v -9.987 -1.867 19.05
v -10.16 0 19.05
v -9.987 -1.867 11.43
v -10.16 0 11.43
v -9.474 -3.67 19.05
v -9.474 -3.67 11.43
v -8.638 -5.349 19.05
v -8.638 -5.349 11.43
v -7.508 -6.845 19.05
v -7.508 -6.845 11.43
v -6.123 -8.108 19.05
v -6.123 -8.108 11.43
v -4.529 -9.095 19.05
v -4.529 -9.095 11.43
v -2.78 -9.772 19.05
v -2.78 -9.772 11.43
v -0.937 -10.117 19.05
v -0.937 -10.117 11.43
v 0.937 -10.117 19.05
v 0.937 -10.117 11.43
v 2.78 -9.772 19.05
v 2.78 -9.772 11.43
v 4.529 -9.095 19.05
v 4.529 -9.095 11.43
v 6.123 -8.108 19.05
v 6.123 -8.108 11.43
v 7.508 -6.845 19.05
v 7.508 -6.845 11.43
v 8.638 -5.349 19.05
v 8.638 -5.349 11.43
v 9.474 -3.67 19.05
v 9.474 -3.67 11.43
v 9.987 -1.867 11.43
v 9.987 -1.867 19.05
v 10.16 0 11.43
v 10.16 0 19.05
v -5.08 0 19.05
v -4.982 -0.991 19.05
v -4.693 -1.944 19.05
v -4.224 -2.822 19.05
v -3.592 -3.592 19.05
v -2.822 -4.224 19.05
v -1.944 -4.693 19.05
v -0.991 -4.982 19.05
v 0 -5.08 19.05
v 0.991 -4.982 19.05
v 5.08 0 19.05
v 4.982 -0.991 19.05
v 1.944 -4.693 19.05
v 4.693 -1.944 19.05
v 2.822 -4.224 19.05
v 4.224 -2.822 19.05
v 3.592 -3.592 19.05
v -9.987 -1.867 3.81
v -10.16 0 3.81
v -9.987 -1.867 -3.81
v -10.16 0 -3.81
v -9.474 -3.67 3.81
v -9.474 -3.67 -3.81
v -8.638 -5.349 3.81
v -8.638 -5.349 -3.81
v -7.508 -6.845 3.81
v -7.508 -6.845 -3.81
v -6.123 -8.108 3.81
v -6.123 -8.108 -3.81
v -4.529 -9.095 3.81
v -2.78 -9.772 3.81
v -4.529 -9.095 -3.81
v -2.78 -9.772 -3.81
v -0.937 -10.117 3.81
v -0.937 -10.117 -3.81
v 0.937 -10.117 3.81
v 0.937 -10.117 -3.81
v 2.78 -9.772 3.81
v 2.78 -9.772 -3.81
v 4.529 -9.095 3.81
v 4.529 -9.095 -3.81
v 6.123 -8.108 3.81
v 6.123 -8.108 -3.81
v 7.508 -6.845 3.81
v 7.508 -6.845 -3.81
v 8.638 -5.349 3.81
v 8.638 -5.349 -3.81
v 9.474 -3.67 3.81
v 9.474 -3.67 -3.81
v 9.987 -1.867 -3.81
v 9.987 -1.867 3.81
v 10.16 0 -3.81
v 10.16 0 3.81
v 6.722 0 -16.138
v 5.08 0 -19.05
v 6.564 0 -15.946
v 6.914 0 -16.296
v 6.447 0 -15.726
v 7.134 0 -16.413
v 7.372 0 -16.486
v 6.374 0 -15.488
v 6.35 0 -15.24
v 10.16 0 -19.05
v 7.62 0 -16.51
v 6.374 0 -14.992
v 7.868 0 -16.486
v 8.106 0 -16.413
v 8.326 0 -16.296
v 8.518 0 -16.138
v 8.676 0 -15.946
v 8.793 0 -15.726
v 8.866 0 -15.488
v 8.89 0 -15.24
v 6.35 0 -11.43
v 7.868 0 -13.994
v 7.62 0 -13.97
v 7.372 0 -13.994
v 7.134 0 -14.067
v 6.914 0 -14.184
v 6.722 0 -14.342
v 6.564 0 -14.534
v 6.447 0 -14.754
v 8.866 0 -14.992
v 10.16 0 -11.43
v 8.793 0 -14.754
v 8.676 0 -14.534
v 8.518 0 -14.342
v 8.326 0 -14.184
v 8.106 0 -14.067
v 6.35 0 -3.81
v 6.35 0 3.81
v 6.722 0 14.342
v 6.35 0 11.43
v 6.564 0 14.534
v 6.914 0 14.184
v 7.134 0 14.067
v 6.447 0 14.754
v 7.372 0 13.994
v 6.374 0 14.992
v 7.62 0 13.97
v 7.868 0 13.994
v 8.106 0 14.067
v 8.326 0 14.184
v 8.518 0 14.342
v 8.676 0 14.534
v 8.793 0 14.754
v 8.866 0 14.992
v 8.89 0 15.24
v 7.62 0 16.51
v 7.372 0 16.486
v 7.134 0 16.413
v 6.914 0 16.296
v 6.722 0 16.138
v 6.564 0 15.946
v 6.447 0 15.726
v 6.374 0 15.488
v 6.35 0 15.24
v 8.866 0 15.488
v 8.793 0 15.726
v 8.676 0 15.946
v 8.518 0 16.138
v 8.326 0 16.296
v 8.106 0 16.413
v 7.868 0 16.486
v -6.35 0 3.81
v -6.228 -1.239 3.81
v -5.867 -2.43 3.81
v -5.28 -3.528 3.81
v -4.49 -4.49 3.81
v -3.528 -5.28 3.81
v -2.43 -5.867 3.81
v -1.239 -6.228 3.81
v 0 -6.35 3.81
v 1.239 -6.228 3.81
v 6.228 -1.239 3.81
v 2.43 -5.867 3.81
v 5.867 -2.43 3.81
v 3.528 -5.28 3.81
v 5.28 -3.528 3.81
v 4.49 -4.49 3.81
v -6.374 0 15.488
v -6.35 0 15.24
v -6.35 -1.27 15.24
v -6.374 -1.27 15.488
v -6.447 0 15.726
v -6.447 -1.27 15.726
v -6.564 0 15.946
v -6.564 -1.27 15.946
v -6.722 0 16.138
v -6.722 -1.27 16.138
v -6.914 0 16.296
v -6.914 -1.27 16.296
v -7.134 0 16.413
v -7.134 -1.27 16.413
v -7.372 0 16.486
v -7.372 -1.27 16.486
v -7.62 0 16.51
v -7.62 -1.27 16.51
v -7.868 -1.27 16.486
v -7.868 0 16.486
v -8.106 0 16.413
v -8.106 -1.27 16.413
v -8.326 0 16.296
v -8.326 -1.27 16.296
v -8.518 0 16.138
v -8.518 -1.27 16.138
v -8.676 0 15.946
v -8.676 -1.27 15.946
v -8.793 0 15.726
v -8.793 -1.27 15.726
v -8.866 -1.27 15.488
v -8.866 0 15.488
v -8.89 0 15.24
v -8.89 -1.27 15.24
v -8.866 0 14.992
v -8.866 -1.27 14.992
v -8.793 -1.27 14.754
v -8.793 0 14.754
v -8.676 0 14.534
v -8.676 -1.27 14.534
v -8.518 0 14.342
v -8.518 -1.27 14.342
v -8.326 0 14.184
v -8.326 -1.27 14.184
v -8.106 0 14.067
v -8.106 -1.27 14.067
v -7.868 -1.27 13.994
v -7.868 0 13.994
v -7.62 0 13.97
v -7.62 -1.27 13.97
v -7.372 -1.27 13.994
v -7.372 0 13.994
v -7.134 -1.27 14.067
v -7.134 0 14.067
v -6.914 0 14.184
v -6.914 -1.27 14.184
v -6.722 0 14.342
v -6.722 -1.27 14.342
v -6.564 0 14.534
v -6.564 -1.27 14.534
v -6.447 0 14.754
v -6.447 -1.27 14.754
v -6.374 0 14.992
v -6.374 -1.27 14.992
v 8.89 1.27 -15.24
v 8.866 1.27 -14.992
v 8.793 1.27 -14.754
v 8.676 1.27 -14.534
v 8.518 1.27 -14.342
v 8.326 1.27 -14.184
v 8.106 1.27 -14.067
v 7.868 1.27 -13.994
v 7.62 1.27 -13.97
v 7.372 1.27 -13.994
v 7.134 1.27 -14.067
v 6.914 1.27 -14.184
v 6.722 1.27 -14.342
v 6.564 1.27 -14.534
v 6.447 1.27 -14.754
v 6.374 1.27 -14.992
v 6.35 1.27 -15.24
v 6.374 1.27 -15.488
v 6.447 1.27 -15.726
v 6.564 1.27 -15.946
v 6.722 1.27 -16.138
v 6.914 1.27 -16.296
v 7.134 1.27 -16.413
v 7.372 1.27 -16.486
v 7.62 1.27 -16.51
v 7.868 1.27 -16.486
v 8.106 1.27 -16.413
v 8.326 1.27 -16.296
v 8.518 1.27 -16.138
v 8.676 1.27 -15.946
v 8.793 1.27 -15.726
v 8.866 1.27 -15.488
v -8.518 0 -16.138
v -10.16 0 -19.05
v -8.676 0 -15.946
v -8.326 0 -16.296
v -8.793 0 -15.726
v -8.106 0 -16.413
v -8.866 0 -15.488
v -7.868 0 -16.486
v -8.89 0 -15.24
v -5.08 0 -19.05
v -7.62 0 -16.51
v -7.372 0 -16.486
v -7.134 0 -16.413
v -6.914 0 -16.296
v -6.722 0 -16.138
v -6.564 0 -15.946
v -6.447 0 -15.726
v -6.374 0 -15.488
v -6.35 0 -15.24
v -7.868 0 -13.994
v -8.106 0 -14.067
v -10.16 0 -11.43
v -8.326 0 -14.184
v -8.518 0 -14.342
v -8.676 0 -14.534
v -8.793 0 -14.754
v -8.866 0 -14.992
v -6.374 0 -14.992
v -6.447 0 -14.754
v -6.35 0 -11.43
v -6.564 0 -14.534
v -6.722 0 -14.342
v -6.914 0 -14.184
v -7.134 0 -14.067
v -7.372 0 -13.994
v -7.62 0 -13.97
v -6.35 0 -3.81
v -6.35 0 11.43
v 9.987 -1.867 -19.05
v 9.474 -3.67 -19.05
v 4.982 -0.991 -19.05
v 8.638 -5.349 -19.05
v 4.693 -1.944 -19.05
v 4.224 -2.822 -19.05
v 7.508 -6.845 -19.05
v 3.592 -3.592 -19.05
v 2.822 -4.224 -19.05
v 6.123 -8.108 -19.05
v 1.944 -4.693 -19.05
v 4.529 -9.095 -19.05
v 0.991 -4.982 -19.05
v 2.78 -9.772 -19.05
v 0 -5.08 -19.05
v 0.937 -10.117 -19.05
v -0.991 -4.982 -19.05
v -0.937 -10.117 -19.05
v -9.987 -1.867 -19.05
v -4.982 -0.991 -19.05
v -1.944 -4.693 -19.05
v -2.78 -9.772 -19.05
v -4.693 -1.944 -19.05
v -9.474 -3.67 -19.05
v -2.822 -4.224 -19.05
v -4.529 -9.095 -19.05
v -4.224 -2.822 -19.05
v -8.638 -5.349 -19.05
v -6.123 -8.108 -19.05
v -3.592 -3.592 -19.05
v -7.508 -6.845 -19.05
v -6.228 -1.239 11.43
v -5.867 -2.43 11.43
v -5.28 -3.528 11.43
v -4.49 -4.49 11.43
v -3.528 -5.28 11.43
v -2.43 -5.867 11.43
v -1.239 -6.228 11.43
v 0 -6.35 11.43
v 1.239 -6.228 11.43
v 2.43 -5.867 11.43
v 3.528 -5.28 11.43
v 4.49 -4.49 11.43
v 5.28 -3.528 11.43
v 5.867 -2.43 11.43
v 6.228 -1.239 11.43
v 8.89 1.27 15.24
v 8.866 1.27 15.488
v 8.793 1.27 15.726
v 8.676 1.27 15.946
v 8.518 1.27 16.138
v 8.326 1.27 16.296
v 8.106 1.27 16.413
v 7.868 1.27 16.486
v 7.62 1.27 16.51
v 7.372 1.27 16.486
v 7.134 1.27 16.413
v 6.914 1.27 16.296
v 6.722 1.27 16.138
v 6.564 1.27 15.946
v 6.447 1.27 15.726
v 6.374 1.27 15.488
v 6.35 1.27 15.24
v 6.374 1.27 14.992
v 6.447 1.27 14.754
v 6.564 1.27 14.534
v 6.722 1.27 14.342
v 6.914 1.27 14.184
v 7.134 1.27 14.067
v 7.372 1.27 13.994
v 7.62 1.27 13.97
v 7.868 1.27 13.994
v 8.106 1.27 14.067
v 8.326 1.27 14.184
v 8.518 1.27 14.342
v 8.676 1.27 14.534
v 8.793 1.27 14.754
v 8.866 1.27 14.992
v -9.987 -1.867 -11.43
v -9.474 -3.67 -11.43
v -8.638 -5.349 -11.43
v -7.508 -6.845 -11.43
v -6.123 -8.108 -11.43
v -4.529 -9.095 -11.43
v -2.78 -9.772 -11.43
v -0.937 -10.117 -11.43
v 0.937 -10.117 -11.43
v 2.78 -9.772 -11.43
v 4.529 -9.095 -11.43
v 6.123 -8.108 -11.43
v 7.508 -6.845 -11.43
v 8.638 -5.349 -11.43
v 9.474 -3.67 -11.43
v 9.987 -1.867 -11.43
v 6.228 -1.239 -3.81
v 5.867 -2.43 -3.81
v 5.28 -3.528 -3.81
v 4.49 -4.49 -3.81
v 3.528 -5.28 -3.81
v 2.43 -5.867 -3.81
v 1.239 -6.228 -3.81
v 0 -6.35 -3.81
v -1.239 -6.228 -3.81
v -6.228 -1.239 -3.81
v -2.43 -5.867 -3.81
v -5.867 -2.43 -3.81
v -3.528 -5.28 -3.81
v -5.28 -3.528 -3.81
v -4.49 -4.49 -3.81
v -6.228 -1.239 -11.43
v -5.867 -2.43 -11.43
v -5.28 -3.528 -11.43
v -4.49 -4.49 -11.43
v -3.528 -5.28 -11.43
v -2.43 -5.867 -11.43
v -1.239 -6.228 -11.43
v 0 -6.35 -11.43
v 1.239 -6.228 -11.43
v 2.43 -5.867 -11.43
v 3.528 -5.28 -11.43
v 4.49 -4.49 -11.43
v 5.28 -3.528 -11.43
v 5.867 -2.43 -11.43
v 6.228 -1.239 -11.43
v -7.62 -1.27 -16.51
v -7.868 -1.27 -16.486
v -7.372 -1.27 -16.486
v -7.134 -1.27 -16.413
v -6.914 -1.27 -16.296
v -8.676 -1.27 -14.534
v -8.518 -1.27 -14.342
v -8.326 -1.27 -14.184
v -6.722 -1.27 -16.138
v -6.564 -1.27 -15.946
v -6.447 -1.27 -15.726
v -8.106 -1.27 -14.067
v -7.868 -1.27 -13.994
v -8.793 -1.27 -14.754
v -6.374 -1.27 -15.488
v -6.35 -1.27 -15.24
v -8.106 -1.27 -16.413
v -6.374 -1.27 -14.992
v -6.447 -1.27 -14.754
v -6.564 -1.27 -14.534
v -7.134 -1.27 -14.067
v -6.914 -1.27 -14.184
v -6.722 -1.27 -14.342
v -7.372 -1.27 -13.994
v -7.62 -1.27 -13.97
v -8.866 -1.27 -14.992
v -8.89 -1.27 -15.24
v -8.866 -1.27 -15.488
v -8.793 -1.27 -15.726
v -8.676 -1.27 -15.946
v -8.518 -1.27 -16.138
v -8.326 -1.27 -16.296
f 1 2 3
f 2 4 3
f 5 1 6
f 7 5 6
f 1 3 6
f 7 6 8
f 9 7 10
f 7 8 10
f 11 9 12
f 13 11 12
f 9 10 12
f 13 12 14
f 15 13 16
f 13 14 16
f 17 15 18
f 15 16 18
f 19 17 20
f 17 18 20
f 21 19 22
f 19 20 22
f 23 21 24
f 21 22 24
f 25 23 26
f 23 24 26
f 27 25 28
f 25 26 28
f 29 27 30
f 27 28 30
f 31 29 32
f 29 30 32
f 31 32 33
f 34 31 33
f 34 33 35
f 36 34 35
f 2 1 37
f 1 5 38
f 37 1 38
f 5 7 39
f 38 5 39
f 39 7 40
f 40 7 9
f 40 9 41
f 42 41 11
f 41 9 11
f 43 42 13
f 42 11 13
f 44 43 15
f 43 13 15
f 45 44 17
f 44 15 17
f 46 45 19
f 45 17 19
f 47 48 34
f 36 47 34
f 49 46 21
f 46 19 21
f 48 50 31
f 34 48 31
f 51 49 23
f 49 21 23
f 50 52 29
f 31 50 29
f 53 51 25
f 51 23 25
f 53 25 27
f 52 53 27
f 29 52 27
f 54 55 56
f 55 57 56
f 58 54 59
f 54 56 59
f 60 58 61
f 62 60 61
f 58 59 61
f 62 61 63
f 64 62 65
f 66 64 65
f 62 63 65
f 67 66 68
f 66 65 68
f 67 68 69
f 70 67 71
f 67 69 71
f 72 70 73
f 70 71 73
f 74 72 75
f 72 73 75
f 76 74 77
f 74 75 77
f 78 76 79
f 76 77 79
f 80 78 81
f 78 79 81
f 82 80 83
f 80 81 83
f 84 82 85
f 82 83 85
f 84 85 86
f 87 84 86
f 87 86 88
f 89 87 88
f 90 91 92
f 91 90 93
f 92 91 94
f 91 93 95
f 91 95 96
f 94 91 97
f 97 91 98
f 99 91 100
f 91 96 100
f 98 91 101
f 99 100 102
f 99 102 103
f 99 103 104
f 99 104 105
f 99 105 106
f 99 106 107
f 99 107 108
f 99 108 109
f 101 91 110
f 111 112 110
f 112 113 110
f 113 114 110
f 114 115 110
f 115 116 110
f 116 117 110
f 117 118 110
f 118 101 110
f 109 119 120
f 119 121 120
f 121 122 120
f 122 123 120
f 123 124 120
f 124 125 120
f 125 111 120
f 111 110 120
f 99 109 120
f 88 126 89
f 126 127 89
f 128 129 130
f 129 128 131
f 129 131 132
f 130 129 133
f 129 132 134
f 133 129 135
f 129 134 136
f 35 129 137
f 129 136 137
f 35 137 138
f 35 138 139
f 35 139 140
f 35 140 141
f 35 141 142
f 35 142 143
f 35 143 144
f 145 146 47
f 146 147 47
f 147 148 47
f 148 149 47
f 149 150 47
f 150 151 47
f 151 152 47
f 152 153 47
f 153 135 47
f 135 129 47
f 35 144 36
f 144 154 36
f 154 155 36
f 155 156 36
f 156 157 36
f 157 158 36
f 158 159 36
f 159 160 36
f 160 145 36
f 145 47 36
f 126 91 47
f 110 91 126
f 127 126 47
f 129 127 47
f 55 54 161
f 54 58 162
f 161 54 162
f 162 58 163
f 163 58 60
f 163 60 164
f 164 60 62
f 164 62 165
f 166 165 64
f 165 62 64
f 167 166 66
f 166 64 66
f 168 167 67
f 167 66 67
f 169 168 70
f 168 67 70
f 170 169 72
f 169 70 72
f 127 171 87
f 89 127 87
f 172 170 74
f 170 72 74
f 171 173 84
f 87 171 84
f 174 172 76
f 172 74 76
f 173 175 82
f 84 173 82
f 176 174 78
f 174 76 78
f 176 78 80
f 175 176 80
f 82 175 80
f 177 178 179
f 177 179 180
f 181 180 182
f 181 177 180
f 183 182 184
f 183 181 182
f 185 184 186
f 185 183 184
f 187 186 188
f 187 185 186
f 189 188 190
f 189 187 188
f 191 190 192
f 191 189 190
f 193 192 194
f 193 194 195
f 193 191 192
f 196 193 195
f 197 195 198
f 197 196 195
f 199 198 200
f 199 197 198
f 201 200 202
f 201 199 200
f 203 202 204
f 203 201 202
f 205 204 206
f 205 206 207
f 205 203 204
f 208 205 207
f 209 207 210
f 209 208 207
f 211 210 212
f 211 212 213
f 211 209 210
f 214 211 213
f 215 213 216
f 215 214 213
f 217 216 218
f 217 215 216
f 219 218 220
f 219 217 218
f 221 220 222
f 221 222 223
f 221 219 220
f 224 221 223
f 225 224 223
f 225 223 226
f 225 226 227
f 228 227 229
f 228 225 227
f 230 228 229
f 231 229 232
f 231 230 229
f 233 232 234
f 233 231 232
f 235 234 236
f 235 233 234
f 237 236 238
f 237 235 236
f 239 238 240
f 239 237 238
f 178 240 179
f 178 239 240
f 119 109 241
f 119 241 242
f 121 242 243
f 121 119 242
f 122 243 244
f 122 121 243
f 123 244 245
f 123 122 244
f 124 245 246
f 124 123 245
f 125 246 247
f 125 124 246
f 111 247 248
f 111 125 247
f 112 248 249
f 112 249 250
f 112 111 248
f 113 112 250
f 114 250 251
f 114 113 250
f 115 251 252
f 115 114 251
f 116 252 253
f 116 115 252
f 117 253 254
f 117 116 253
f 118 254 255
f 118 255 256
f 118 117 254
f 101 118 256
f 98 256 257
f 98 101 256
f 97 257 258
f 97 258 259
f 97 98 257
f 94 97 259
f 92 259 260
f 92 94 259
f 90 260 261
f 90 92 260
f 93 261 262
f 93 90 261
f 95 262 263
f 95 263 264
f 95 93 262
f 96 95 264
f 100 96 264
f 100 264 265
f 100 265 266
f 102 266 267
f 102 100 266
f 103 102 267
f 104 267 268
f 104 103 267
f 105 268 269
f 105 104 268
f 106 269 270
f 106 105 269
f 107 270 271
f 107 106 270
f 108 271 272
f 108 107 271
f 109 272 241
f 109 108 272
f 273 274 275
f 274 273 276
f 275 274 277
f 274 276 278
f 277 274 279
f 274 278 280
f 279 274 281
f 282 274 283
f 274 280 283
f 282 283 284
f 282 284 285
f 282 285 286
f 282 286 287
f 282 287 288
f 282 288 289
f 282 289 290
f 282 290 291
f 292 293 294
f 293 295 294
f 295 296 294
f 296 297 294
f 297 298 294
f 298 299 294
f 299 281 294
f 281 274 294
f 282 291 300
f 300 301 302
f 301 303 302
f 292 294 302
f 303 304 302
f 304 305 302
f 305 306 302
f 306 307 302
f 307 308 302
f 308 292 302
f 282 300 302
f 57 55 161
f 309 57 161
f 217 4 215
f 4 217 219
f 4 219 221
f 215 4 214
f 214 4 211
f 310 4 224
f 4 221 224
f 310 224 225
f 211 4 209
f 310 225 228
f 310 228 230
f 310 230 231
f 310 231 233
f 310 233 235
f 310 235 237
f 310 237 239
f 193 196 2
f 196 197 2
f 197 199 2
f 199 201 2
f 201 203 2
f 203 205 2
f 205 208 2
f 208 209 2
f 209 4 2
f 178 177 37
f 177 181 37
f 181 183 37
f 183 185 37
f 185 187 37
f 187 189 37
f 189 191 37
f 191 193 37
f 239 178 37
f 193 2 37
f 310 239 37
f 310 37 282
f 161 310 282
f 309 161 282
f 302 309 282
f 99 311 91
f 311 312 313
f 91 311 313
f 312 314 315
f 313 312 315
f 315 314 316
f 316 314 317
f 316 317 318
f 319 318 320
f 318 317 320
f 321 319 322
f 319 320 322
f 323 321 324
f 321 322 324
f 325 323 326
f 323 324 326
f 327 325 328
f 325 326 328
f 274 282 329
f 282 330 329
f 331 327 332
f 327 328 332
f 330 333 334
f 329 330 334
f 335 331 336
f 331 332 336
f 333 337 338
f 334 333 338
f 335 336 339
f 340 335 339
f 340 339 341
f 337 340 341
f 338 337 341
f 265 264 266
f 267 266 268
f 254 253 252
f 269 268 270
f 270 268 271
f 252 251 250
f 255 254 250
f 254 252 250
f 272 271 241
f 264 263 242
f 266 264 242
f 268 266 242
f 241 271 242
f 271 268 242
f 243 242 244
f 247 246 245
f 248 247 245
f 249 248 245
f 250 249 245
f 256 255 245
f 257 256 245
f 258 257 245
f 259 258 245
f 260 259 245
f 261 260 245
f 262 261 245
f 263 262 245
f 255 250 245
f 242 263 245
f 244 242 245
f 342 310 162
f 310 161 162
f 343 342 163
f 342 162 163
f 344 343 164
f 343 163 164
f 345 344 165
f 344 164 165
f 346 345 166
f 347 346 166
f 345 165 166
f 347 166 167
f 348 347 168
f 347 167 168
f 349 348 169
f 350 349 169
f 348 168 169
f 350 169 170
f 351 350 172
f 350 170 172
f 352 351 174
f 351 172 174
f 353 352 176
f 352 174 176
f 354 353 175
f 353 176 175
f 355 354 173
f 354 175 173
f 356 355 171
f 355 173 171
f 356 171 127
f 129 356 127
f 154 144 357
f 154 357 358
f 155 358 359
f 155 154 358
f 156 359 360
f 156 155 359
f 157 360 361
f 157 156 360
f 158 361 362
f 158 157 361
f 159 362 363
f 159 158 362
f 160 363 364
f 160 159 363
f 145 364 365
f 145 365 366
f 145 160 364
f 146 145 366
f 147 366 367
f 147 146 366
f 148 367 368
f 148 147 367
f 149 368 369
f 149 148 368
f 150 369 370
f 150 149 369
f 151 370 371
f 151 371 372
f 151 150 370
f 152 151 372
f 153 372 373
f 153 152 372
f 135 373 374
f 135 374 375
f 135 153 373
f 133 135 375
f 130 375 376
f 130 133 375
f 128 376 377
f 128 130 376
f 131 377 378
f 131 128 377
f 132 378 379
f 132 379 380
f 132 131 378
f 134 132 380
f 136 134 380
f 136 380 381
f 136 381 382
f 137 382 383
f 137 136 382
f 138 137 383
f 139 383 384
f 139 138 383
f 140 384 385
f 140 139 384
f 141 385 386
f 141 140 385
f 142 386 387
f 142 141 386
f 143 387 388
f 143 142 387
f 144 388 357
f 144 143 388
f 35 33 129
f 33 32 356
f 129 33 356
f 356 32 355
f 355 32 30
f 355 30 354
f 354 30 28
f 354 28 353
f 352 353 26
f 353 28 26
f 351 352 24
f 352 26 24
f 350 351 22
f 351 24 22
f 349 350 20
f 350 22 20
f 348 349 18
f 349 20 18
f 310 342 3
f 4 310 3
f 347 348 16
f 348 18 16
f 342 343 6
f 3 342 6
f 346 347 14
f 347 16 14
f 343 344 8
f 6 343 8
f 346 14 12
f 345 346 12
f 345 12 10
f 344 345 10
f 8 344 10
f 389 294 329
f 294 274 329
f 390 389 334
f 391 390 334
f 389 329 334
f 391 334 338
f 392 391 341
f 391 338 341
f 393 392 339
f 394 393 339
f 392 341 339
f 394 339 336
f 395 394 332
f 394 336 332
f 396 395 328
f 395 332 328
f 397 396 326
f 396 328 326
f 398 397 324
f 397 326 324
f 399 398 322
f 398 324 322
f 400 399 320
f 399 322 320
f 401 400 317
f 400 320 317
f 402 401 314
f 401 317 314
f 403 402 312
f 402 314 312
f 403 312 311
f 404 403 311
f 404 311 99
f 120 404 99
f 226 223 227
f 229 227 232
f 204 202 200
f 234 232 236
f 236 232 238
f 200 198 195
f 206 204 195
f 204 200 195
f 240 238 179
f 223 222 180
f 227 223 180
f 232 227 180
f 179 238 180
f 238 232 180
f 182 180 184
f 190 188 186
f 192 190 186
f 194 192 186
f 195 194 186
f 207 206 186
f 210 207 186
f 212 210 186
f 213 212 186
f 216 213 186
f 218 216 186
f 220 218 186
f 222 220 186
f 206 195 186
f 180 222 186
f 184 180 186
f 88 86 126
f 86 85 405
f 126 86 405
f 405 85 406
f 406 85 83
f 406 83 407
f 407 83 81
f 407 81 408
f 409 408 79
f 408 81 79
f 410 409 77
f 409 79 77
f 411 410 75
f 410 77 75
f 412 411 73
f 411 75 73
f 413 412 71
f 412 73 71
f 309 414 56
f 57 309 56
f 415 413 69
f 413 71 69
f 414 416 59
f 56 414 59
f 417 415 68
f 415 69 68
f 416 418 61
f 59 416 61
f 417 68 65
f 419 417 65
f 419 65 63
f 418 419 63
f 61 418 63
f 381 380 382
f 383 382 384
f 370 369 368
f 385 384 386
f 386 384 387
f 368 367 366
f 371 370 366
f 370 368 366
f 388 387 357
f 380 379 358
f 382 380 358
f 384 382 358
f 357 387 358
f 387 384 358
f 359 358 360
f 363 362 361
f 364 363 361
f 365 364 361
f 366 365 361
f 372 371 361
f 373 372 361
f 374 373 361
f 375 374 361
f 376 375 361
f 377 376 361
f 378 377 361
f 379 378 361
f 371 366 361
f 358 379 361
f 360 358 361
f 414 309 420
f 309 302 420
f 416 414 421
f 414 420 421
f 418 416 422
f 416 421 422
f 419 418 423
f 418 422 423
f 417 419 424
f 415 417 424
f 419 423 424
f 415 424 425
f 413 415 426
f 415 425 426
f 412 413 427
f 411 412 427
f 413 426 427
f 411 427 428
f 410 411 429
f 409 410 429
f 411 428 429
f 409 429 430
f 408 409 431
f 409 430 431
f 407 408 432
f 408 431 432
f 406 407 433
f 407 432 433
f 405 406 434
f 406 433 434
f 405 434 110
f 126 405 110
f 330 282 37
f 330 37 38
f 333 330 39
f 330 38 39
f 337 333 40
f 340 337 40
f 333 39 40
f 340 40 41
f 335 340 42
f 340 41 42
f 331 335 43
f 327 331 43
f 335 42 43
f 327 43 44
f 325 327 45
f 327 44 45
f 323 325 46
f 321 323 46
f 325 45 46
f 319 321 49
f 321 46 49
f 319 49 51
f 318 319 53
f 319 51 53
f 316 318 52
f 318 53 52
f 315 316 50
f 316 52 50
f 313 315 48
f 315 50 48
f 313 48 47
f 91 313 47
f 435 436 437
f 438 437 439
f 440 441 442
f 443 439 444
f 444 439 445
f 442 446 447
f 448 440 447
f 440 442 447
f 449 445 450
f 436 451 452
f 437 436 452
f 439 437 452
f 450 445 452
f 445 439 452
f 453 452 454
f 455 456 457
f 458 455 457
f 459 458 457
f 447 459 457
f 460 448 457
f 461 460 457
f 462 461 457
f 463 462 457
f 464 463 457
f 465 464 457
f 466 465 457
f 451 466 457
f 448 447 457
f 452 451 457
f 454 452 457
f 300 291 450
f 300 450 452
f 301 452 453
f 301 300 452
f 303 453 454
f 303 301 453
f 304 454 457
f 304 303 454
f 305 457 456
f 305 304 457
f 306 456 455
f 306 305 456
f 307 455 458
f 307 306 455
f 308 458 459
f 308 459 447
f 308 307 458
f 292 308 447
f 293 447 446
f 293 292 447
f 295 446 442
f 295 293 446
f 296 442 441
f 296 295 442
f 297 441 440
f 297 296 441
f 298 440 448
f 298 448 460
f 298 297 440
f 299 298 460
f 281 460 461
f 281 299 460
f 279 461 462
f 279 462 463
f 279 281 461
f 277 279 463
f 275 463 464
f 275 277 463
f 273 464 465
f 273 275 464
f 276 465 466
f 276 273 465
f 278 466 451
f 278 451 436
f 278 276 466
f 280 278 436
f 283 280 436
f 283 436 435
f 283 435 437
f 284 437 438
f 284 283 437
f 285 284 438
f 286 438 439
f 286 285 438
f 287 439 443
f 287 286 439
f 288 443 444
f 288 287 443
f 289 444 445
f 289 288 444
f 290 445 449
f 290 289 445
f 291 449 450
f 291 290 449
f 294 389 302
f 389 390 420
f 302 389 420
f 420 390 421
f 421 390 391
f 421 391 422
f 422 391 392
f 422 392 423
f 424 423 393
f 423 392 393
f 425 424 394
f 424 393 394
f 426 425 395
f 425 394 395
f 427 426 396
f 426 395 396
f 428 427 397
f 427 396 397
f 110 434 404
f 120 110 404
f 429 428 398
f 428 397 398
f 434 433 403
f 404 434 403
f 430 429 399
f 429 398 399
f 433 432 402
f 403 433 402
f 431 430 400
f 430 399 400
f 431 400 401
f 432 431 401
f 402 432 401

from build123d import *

# Parameters (mm, degrees)
F1_ANGLE = 180
F3_DEPTH = 25.4
F4_R     = 1.27
F5_DEPTH = 1.27
F6_R     = 1.27
F7_DEPTH = 1.27


with BuildPart() as f1:
    # F0 (on Front) → F1 (revolve)
    with BuildSketch(Plane.XZ):
        Polygon((0, -19.05), (0, 19.05), (-10.16, 19.05), (-10.16, 11.43), (-6.35, 11.43), (-6.35, 3.81), (-10.16, 3.81), (-10.16, -3.81), (-6.35, -3.81), (-6.35, -11.43), (-10.16, -11.43), (-10.16, -19.05), align=None)
    revolve(axis=Axis((0, 0, 0), (0, 0, 1)), revolution_arc=F1_ANGLE)

    # F2 (on Top) → F3 (cut, symmetric)
    with BuildSketch(Plane.XY):
        with BuildLine():
            ThreePointArc((-5.08, 0), (0, -5.08), (5.08, 0))
            Line((5.08, 0), (-5.08, 0))
        make_face()
    extrude(amount=F3_DEPTH, both=True, mode=Mode.SUBTRACT)

    # F4 (on Front) → F5 (join)
    with BuildSketch(Plane.XZ):
        with Locations((7.62, 15.24)):
            Circle(F4_R)
        with Locations((7.62, -15.24)):
            Circle(F4_R)
    extrude(amount=-F5_DEPTH)

    # F6 (on Front) → F7 (cut)
    with BuildSketch(Plane.XZ):
        with Locations((-7.62, 15.24)):
            Circle(F6_R)
        with Locations((-7.62, -15.24)):
            Circle(F6_R)
    extrude(amount=F7_DEPTH, mode=Mode.SUBTRACT)


solid = f1.part
